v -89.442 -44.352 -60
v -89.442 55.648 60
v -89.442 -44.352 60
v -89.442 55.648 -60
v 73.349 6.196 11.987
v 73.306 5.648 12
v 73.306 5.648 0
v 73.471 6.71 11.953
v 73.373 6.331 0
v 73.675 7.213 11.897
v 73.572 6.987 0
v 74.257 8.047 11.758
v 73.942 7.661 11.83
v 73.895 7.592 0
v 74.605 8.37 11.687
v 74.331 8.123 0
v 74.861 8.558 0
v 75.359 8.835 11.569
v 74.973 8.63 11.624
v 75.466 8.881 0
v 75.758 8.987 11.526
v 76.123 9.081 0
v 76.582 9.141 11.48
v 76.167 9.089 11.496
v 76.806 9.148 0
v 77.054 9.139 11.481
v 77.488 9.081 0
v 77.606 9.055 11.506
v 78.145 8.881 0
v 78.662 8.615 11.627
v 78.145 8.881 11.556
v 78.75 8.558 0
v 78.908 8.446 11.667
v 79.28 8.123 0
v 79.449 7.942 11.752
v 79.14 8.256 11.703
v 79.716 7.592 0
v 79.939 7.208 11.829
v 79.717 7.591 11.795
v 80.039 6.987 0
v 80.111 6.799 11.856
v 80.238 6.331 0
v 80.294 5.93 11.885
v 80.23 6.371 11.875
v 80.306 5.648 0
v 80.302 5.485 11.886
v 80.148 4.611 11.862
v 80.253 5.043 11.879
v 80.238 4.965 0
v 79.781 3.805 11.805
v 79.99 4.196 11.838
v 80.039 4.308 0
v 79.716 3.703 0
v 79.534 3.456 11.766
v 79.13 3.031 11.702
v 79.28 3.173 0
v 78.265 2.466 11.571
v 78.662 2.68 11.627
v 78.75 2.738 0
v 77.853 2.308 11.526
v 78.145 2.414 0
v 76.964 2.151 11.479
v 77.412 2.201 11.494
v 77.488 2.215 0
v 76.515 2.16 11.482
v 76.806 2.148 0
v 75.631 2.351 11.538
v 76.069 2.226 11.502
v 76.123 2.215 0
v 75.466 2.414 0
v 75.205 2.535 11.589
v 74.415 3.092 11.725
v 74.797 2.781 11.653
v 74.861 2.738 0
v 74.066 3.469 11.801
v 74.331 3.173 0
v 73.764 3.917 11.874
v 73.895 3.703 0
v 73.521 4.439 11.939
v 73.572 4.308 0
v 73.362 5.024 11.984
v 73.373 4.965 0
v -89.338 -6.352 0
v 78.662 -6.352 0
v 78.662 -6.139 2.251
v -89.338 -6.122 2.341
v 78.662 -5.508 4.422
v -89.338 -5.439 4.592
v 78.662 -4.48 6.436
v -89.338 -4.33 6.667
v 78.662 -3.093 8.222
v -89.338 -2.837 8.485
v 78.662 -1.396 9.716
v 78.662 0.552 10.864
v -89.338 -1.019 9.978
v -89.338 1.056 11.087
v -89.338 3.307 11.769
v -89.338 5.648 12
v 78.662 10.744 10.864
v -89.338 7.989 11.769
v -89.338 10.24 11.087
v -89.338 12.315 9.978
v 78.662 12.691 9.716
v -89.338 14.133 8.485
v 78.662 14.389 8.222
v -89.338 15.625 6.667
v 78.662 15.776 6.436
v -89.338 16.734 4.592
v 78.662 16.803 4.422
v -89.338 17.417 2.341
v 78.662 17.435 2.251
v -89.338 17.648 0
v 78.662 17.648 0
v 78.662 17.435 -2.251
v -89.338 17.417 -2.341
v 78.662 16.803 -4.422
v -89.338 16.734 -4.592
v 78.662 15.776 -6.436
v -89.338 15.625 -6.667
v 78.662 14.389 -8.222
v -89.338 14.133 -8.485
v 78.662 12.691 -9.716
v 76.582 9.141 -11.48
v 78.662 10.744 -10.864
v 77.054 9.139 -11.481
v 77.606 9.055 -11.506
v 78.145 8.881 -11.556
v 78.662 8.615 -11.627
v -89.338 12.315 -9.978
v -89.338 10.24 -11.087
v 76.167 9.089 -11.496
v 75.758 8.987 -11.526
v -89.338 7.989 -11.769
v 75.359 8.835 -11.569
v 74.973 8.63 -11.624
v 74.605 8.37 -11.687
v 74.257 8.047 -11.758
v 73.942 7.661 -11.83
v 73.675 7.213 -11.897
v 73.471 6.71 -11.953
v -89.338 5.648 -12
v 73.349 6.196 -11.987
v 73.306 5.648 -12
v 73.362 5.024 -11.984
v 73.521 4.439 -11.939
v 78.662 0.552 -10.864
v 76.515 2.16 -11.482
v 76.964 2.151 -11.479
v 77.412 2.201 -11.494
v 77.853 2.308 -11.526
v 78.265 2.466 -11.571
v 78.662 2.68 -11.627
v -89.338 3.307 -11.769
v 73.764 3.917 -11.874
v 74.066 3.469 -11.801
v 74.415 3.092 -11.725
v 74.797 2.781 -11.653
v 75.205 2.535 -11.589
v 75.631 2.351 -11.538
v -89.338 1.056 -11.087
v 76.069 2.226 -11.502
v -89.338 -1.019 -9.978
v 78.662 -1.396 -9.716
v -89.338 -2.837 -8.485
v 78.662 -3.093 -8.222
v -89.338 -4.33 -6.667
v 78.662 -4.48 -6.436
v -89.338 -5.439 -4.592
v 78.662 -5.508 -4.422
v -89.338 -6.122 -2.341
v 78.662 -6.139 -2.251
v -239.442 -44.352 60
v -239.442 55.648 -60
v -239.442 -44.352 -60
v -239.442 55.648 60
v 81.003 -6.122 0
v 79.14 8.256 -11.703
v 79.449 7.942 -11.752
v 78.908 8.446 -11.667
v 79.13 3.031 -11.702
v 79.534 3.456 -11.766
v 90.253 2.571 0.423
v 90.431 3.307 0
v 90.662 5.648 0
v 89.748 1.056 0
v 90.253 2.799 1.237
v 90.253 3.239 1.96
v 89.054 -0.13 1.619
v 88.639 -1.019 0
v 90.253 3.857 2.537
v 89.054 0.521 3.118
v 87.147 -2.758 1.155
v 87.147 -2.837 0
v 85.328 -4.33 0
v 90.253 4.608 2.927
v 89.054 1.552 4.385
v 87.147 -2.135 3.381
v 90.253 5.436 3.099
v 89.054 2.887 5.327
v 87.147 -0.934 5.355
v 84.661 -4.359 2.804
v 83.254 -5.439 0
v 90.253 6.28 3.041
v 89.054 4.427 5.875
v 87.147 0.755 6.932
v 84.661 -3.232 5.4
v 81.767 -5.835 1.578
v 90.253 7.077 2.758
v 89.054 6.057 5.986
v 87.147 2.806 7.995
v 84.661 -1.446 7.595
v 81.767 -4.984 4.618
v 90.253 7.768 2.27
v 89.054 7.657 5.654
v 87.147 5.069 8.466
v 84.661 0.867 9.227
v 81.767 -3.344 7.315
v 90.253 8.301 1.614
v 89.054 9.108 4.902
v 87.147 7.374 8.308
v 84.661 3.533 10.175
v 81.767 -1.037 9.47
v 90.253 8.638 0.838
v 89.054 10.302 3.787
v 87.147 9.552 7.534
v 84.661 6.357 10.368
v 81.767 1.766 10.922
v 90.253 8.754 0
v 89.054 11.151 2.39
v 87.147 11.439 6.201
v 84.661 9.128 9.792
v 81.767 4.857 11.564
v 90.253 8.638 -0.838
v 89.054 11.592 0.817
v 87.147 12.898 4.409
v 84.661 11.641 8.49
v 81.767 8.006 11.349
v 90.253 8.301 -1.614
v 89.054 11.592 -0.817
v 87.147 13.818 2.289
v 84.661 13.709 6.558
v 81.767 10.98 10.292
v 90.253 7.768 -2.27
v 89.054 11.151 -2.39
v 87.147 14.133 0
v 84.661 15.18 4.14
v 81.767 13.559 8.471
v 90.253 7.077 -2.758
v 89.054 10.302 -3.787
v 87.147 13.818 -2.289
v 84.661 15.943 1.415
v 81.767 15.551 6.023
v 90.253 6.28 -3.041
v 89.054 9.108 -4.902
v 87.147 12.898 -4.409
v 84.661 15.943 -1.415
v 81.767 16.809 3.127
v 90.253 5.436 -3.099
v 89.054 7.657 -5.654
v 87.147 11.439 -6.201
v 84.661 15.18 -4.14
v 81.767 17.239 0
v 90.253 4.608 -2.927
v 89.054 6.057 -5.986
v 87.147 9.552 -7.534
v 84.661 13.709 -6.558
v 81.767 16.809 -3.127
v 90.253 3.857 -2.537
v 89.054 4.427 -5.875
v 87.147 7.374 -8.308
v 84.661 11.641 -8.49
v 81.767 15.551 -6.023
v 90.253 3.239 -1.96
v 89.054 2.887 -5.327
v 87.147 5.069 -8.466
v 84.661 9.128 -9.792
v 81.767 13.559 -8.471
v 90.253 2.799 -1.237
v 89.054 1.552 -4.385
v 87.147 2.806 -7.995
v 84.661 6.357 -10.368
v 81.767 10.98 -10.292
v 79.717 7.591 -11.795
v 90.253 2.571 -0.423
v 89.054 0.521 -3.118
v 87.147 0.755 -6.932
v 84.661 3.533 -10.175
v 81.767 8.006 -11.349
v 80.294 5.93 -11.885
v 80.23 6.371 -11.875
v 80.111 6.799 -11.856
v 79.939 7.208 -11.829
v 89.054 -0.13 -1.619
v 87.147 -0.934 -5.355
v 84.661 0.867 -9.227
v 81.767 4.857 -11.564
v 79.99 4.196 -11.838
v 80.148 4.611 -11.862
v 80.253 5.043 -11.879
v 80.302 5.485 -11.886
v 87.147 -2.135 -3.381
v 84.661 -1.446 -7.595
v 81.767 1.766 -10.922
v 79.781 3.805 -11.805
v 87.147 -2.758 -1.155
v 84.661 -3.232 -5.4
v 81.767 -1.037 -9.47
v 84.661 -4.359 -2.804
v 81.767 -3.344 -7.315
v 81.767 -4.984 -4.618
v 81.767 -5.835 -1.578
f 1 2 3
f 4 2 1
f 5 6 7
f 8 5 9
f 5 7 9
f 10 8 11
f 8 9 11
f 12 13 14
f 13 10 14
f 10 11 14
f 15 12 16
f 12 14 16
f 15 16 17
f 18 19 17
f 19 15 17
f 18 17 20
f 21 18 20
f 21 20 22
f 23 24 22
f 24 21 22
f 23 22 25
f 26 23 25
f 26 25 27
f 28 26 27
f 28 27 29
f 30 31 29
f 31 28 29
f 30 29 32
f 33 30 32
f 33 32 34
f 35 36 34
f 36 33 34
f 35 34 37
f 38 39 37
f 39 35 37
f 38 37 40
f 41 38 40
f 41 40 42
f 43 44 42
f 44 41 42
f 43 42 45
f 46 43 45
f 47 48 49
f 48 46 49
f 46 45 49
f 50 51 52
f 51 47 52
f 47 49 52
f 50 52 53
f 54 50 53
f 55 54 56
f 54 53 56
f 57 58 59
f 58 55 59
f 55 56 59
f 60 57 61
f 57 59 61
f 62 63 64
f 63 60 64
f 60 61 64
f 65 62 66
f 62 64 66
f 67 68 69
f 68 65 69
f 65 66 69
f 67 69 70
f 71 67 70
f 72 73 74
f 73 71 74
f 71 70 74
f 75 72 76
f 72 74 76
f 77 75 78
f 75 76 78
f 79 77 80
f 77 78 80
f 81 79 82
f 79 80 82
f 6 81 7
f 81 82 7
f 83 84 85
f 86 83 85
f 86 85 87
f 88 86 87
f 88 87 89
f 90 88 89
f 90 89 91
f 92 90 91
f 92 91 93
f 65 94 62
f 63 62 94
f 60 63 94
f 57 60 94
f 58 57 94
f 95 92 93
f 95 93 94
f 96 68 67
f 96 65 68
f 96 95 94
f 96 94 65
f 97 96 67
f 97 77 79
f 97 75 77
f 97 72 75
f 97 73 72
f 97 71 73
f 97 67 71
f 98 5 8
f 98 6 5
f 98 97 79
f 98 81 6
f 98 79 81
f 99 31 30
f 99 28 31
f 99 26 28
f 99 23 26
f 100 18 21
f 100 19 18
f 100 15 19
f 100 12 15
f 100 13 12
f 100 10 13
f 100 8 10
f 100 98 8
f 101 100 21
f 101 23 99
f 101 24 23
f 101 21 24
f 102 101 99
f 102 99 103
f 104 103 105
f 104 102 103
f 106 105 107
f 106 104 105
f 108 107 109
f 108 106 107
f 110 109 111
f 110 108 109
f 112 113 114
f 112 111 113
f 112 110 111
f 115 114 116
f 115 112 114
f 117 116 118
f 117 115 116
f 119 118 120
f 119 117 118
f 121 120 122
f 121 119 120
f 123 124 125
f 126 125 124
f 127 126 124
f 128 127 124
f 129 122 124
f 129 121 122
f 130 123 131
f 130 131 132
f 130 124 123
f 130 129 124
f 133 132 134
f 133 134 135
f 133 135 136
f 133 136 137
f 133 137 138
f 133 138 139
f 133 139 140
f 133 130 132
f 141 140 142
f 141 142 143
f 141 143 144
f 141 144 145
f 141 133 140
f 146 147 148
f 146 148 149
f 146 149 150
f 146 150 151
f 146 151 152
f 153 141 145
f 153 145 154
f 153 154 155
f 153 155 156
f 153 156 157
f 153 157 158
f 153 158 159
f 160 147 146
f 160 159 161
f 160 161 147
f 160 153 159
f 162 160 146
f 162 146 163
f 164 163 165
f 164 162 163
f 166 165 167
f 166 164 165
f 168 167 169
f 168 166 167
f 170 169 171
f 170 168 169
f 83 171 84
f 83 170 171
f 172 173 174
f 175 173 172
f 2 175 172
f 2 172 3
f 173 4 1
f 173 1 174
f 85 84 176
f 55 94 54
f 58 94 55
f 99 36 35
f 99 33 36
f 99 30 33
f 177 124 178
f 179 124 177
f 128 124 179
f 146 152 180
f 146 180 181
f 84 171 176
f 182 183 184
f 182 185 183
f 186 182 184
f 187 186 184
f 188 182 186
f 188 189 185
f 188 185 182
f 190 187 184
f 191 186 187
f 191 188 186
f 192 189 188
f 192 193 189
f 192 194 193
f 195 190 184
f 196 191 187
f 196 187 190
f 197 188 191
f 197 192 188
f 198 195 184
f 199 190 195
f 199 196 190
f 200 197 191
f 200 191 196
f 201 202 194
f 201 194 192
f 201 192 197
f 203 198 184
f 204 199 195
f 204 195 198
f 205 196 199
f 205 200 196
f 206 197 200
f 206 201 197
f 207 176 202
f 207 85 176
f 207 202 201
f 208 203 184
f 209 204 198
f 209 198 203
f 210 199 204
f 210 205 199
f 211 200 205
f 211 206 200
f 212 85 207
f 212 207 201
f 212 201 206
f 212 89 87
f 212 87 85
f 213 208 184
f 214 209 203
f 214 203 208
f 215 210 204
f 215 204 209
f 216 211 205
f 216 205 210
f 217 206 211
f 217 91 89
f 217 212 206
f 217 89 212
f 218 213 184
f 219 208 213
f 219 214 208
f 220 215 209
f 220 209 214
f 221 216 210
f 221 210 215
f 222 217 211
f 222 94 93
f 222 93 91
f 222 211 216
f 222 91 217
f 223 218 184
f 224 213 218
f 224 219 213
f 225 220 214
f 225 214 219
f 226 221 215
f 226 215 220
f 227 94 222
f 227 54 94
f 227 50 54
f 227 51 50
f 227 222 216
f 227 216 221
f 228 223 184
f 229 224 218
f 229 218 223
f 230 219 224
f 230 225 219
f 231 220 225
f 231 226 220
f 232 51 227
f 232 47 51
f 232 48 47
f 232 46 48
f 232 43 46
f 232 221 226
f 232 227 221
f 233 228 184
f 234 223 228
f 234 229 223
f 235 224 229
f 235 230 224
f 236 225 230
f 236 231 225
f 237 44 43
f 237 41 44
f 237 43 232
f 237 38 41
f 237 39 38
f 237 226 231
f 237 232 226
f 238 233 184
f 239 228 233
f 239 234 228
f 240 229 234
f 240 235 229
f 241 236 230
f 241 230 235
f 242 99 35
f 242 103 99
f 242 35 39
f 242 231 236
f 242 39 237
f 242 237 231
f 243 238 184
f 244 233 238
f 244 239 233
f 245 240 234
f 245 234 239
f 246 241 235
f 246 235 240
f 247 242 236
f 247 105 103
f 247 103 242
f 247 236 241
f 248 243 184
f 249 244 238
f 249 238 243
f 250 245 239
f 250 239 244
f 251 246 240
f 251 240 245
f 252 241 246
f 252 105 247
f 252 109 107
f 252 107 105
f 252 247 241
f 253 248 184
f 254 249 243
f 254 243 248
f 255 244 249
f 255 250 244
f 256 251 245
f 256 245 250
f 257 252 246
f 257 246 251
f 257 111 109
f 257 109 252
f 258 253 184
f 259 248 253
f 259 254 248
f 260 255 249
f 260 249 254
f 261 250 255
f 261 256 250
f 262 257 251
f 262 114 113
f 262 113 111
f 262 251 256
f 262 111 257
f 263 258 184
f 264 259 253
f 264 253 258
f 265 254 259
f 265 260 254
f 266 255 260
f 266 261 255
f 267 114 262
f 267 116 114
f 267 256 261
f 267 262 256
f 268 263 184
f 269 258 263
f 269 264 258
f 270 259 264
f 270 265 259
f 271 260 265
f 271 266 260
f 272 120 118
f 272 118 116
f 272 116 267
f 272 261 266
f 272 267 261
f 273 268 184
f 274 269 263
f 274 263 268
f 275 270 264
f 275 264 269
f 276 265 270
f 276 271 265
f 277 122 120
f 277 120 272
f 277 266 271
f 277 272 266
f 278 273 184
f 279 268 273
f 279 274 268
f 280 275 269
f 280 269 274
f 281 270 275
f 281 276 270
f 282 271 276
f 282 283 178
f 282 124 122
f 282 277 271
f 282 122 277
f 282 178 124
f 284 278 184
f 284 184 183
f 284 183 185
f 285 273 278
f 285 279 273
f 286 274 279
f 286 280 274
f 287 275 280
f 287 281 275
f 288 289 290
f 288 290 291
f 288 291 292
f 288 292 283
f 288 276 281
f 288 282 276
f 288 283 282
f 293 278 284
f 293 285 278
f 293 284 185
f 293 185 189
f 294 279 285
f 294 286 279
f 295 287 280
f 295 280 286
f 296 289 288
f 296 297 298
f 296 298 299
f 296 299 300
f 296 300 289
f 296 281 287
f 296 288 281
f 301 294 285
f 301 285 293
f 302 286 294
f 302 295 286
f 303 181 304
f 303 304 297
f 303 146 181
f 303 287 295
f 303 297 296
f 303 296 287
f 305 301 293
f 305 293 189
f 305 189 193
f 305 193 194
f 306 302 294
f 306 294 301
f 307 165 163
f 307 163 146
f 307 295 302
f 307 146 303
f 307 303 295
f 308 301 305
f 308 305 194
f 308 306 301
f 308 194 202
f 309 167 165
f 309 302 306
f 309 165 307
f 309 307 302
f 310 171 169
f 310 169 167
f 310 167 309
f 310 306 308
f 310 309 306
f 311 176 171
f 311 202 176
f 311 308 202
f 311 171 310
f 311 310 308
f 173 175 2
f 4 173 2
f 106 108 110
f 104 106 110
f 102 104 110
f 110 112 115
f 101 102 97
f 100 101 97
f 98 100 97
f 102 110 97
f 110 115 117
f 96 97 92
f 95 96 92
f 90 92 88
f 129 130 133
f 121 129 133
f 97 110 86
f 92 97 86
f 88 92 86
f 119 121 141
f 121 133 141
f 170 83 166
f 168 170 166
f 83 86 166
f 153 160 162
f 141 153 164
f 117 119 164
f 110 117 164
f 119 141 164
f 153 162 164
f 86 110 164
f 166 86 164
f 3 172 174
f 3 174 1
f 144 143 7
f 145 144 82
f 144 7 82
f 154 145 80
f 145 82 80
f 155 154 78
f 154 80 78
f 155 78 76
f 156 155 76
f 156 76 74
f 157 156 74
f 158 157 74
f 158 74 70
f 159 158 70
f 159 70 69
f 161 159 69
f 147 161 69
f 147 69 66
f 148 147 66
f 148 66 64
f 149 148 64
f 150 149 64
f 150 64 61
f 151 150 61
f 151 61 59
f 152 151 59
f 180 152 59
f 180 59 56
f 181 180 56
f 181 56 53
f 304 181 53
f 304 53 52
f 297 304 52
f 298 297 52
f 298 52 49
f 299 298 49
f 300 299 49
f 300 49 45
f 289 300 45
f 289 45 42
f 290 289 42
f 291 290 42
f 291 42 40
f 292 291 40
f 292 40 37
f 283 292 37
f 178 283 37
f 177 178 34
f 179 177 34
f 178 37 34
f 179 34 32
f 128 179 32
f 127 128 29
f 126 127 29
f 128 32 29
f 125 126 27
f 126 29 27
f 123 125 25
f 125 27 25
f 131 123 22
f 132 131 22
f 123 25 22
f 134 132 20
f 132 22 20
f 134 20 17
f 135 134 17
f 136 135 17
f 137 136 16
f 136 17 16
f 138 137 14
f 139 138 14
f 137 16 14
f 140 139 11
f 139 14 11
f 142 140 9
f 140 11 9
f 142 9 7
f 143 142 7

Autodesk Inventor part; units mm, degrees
ref_plane "YZ Plane" through (0, 0, 0) normal (1, 0, 0) x (0, 1, 0)
ref_plane "XZ Plane" through (0, 0, 0) normal (0, 1, 0) x (-1, 0, 0)
ref_plane "XY Plane" through (0, 0, 0) normal (0, 0, 1) x (1, 0, 0)
sketch "Sketch1" plane through (0, 0, 0) normal (0, 0, 1) x (1, 0, 0)
  line L0 (-89.3385, 5.6478) -> (90.6615, 5.6478)
  line L1 (90.6615, 5.6478) -> (90.6615, -6.3522)
  line L2 (90.6615, -6.3522) -> (-89.3385, -6.3522)
  line L3 (-89.3385, -6.3522) -> (-89.3385, 5.6478)
  point P0 (0, 0)
  dimension "d0" = 180
  dimension "d1" = 12
revolve "Revolution1" add sketch "Sketch1" angle 360 about axis through (-89.3385, 5.6478, 0) along (1, 0, 0)
sketch "Sketch2" plane through (90.6615, 5.6478, 0) normal (1, 0, 0) x (0, 0, -1)
  point P0 (0, -5.6478)
fillet "Fillet1" radius 12 1 edges at (90.6615, 17.6478, 0)
sketch "Sketch3" plane through (-89.3385, 5.6478, 0) normal (-1, 0, 0) x (0, 0, 1)
  point P0 (0, -5.6478)
sketch "Sketch4" plane through (78.6615, 5.6478, 0) normal (0, 0, 1) x (-1, 0, 0)
  circle A0 centre (1.8559, 0) radius 3.5
  point P0 (0, 0)
  dimension "d10" = 7
extrude "Extrusion1" cut sketch "Sketch4" along normal mid plane 80
sketch "Sketch5" plane through (-89.3385, 5.6478, 0) normal (0, -1, 0) x (1, 0, 0)
  line L0 (-0.103, -60) -> (-150.103, -60)
  line L1 (-150.103, -60) -> (-150.103, 60)
  line L2 (-150.103, 60) -> (-0.103, 60)
  line L3 (-0.103, 60) -> (-0.103, -60)
  point P0 (0, 0)
  dimension "d19" = 120
  dimension "d20" = 150
  dimension "d21" = 60
extrude "Extrusion2" add sketch "Sketch5" along normal mid plane 100
properties part number "Piston Model"
